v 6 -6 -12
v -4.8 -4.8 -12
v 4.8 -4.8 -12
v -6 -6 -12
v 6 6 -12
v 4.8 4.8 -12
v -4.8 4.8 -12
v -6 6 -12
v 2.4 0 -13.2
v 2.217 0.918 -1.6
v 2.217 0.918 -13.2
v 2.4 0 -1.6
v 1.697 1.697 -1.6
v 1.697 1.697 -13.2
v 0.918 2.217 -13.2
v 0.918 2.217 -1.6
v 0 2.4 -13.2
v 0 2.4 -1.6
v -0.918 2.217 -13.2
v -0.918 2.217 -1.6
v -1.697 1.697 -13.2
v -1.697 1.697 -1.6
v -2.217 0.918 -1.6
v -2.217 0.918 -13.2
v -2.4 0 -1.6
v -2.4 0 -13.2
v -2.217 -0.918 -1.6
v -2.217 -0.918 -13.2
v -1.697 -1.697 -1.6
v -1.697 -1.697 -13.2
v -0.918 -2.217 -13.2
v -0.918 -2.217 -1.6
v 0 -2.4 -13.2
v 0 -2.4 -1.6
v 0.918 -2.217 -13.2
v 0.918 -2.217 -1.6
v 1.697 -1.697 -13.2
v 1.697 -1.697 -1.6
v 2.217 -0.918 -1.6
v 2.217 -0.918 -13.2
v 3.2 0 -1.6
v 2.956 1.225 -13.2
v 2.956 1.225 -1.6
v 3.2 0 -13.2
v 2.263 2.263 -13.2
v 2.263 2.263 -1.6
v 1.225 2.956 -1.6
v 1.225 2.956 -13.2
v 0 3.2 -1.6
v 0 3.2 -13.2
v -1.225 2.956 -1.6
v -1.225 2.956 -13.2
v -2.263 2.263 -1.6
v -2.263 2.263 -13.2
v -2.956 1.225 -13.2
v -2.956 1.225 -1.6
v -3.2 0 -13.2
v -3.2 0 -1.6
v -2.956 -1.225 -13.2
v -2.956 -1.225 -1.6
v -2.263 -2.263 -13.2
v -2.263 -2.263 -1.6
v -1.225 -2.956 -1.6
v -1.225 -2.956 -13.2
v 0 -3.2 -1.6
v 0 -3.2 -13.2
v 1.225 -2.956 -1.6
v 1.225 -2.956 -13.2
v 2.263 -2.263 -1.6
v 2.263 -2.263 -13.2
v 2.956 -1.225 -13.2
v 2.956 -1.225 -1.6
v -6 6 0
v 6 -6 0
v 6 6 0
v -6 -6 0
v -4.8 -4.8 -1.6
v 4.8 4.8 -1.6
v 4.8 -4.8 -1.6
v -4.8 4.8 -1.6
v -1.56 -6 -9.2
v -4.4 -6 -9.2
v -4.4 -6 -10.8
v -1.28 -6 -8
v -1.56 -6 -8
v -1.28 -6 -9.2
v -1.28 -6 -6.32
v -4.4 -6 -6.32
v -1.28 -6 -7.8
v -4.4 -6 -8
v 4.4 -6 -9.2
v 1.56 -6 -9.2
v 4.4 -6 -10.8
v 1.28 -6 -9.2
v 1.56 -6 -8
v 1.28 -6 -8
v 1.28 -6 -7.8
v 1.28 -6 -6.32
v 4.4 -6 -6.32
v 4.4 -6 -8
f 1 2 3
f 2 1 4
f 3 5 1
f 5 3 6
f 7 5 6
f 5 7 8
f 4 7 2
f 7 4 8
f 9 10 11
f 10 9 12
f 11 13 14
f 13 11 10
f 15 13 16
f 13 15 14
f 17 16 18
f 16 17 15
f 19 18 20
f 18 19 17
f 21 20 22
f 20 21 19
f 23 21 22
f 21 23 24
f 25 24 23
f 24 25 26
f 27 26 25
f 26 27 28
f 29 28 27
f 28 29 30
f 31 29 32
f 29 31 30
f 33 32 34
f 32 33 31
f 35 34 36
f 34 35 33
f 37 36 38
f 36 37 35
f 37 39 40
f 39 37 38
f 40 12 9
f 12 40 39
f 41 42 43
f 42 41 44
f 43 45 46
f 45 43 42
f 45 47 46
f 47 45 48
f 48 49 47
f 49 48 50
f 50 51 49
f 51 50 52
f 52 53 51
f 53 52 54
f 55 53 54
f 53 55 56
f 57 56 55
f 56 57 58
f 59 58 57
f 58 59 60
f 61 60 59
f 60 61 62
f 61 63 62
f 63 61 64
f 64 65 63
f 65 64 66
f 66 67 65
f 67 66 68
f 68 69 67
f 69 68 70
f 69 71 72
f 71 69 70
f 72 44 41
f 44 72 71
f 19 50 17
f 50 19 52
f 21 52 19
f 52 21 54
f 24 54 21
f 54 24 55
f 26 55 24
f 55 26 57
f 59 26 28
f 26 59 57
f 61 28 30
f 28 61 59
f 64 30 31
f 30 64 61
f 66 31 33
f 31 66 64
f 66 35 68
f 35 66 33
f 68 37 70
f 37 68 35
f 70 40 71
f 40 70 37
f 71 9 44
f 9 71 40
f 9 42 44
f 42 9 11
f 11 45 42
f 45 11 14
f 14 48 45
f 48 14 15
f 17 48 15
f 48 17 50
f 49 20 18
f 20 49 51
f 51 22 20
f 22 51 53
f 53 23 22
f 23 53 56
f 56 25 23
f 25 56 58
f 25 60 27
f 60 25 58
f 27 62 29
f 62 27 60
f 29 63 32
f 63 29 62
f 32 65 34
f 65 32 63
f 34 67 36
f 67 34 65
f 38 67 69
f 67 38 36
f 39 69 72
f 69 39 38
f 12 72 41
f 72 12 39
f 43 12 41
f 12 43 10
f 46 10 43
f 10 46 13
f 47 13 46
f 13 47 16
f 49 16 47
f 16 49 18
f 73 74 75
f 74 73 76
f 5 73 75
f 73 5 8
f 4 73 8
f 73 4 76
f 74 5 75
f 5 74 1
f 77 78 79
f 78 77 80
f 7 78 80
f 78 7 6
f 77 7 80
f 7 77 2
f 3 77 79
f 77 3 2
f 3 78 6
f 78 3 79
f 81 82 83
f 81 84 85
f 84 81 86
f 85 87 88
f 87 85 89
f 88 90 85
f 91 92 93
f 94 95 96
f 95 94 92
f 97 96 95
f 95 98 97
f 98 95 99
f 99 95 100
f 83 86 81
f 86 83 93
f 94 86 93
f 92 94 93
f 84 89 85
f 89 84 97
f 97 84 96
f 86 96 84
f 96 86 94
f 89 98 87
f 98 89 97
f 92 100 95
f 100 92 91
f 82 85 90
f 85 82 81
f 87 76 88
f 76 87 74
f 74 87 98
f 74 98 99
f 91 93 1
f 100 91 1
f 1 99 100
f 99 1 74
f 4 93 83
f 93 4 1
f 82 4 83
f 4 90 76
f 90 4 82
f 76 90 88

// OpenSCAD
// file: ../p/4-4ring3.scad
use <../lib.scad>
$fa=1; $fs=0.2;
function ldraw_lib__4_4ring3(realsolid=false) = [
// 0 Ring  3 x 1.0
// 0 Name: 4-4ring3.dat
// 0 Author: James Jessiman
// 0 !LDRAW_ORG Primitive UPDATE 2009-01
// 0 !LICENSE Licensed under CC BY 2.0 and CC BY 4.0 : see CAreadme.txt
// 
// 0 BFC CERTIFY CCW
  [0,"BFC","CERTIFY"],
  [0,"BFC","CCW"],
// 
// 0 !HISTORY 1998-12-15 [PTadmin] Official Update 1998-10
// 0 !HISTORY 2002-04-05 [hafhead] Added BFC statement
// 0 !HISTORY 2002-04-25 [PTadmin] Official Update 2002-02
// 0 !HISTORY 2007-06-24 [PTadmin] Header formatted for Contributor Agreement
// 0 !HISTORY 2008-07-01 [PTadmin] Official Update 2008-01
// 0 !HISTORY 2008-08-26 [cwdee] Switch polygon winding and rename
// 0 !HISTORY 2009-05-02 [PTadmin] Official Update 2009-01
// 
// 
// 4 16 -1.5308 0 3.6956 -1.1481 0 2.7717 0 0 3 0 0 4
  [4,16,-1.5308,0,3.6956,-1.1481,0,2.7717,0,0,3,0,0,4],
// 4 16 -2.8284 0 2.8284 -2.1213 0 2.1213 -1.1481 0 2.7717 -1.5308 0 3.6956
  [4,16,-2.8284,0,2.8284,-2.1213,0,2.1213,-1.1481,0,2.7717,-1.5308,0,3.6956],
// 4 16 -3.6956 0 1.5308 -2.7717 0 1.1481 -2.1213 0 2.1213 -2.8284 0 2.8284
  [4,16,-3.6956,0,1.5308,-2.7717,0,1.1481,-2.1213,0,2.1213,-2.8284,0,2.8284],
// 4 16 -4 0 0 -3 0 0 -2.7717 0 1.1481 -3.6956 0 1.5308
  [4,16,-4,0,0,-3,0,0,-2.7717,0,1.1481,-3.6956,0,1.5308],
// 4 16 -3.6956 0 -1.5308 -2.7717 0 -1.1481 -3 0 0 -4 0 0
  [4,16,-3.6956,0,-1.5308,-2.7717,0,-1.1481,-3,0,0,-4,0,0],
// 4 16 -2.8284 0 -2.8284 -2.1213 0 -2.1213 -2.7717 0 -1.1481 -3.6956 0 -1.5308
  [4,16,-2.8284,0,-2.8284,-2.1213,0,-2.1213,-2.7717,0,-1.1481,-3.6956,0,-1.5308],
// 4 16 -1.5308 0 -3.6956 -1.1481 0 -2.7717 -2.1213 0 -2.1213 -2.8284 0 -2.8284
  [4,16,-1.5308,0,-3.6956,-1.1481,0,-2.7717,-2.1213,0,-2.1213,-2.8284,0,-2.8284],
// 4 16 0 0 -4 0 0 -3 -1.1481 0 -2.7717 -1.5308 0 -3.6956
  [4,16,0,0,-4,0,0,-3,-1.1481,0,-2.7717,-1.5308,0,-3.6956],
// 4 16 1.5308 0 -3.6956 1.1481 0 -2.7717 0 0 -3 0 0 -4
  [4,16,1.5308,0,-3.6956,1.1481,0,-2.7717,0,0,-3,0,0,-4],
// 4 16 2.8284 0 -2.8284 2.1213 0 -2.1213 1.1481 0 -2.7717 1.5308 0 -3.6956
  [4,16,2.8284,0,-2.8284,2.1213,0,-2.1213,1.1481,0,-2.7717,1.5308,0,-3.6956],
// 4 16 3.6956 0 -1.5308 2.7717 0 -1.1481 2.1213 0 -2.1213 2.8284 0 -2.8284
  [4,16,3.6956,0,-1.5308,2.7717,0,-1.1481,2.1213,0,-2.1213,2.8284,0,-2.8284],
// 4 16 4 0 0 3 0 0 2.7717 0 -1.1481 3.6956 0 -1.5308
  [4,16,4,0,0,3,0,0,2.7717,0,-1.1481,3.6956,0,-1.5308],
// 4 16 3.6956 0 1.5308 2.7717 0 1.1481 3 0 0 4 0 0
  [4,16,3.6956,0,1.5308,2.7717,0,1.1481,3,0,0,4,0,0],
// 4 16 2.8284 0 2.8284 2.1213 0 2.1213 2.7717 0 1.1481 3.6956 0 1.5308
  [4,16,2.8284,0,2.8284,2.1213,0,2.1213,2.7717,0,1.1481,3.6956,0,1.5308],
// 4 16 1.5308 0 3.6956 1.1481 0 2.7717 2.1213 0 2.1213 2.8284 0 2.8284
  [4,16,1.5308,0,3.6956,1.1481,0,2.7717,2.1213,0,2.1213,2.8284,0,2.8284],
// 4 16 0 0 4 0 0 3 1.1481 0 2.7717 1.5308 0 3.6956
  [4,16,0,0,4,0,0,3,1.1481,0,2.7717,1.5308,0,3.6956],
// 0
];
module ldraw_lib__4_4ring3(step=0, col=false, unit=2/5, alt=false, line=0.2, solid=!$preview)
    makepoly(ldraw_lib__4_4ring3(solid), step=step, col=col, unit=unit, alt=alt, line=line, solid=solid);
ldraw_lib__4_4ring3(line=0.2);
// file: ../p/4-4edge.scad
use <../lib.scad>
function ldraw_lib__4_4edge() = [
// 0 Circle 1.0
// 0 Name: 4-4edge.dat
// 0 Author: James Jessiman
// 0 !LDRAW_ORG Primitive UPDATE 2017-01
// 0 !LICENSE Licensed under CC BY 2.0 and CC BY 4.0 : see CAreadme.txt
// 
// 0 BFC CERTIFY CCW
  [0,"BFC","CERTIFY"],
  [0,"BFC","CCW"],
// 
// 0 !HISTORY 1998-12-15 [PTadmin] Official Update 1998-10
// 0 !HISTORY 2005-12-28 [PTadmin] Official Update 2005-01
// 0 !HISTORY 2007-06-24 [PTadmin] Header formatted for Contributor Agreement
// 0 !HISTORY 2008-07-01 [PTadmin] Official Update 2008-01
// 0 !HISTORY 2017-01-15 [Steffen] BFCed
// 0 !HISTORY 2017-12-30 [PTadmin] Official Update 2017-01
// 
// 
// 2 24 1 0 0 0.9239 0 0.3827
  [2,24,1,0,0,0.9239,0,0.3827],
// 2 24 0.9239 0 0.3827 0.7071 0 0.7071
  [2,24,0.9239,0,0.3827,0.7071,0,0.7071],
// 2 24 0.7071 0 0.7071 0.3827 0 0.9239
  [2,24,0.7071,0,0.7071,0.3827,0,0.9239],
// 2 24 0.3827 0 0.9239 0 0 1
  [2,24,0.3827,0,0.9239,0,0,1],
// 2 24 0 0 1 -0.3827 0 0.9239
  [2,24,0,0,1,-0.3827,0,0.9239],
// 2 24 -0.3827 0 0.9239 -0.7071 0 0.7071
  [2,24,-0.3827,0,0.9239,-0.7071,0,0.7071],
// 2 24 -0.7071 0 0.7071 -0.9239 0 0.3827
  [2,24,-0.7071,0,0.7071,-0.9239,0,0.3827],
// 2 24 -0.9239 0 0.3827 -1 0 -0
  [2,24,-0.9239,0,0.3827,-1,0,-0],
// 2 24 -1 0 -0 -0.9239 0 -0.3827
  [2,24,-1,0,-0,-0.9239,0,-0.3827],
// 2 24 -0.9239 0 -0.3827 -0.7071 0 -0.7071
  [2,24,-0.9239,0,-0.3827,-0.7071,0,-0.7071],
// 2 24 -0.7071 0 -0.7071 -0.3827 0 -0.9239
  [2,24,-0.7071,0,-0.7071,-0.3827,0,-0.9239],
// 2 24 -0.3827 0 -0.9239 0 0 -1
  [2,24,-0.3827,0,-0.9239,0,0,-1],
// 2 24 0 0 -1 0.3827 0 -0.9239
  [2,24,0,0,-1,0.3827,0,-0.9239],
// 2 24 0.3827 0 -0.9239 0.7071 0 -0.7071
  [2,24,0.3827,0,-0.9239,0.7071,0,-0.7071],
// 2 24 0.7071 0 -0.7071 0.9239 0 -0.3827
  [2,24,0.7071,0,-0.7071,0.9239,0,-0.3827],
// 2 24 0.9239 0 -0.3827 1 0 0
  [2,24,0.9239,0,-0.3827,1,0,0],
];
module ldraw_lib__4_4edge(step=0, col=false, unit=2/5, alt=false, line=0.2, solid=!$preview)
    makepoly(ldraw_lib__4_4edge(), step=step, col=col, unit=unit, alt=alt, line=line, solid=solid);
ldraw_lib__4_4edge(line=0.2);
// file: ../p/4-4cyli.scad
use <../lib.scad>
$fa=1; $fs=0.2;
function ldraw_lib__4_4cyli(realsolid=false) = [
// 0 Cylinder 1.0
// 0 Name: 4-4cyli.dat
// 0 Author: James Jessiman
// 0 !LDRAW_ORG Primitive UPDATE 2005-01
// 0 !LICENSE Licensed under CC BY 2.0 and CC BY 4.0 : see CAreadme.txt
// 
// 0 BFC CERTIFY CCW
  [0,"BFC","CERTIFY"],
  [0,"BFC","CCW"],
// 
// 0 !HISTORY 1998-12-15 [PTadmin] Official Update 1998-10
// 0 !HISTORY 2002-03-23 [sbliss] Added BFC statement; merged headers from files in distributions LDraw 0.27 and Complete.
// 0 !HISTORY 2002-04-25 [PTadmin] Official Update 2002-02
// 0 !HISTORY 2004-12-14 [guyvivan] BFC CCW
// 0 !HISTORY 2005-12-28 [PTadmin] Official Update 2005-01
// 0 !HISTORY 2007-06-24 [PTadmin] Header formatted for Contributor Agreement
// 0 !HISTORY 2008-07-01 [PTadmin] Official Update 2008-01
// 
// 
// 4 16 1 1 0 0.9239 1 0.3827 0.9239 0 0.3827 1 0 0
  [4,16,1,1,0,0.9239,1,0.3827,0.9239,0,0.3827,1,0,0],
// 5 24 1 0 0 1 1 0 0.9239 0 0.3827 0.9239 0 -0.3827
  [5,24,1,0,0,1,1,0,0.9239,0,0.3827,0.9239,0,-0.3827],
// 4 16 0.9239 1 0.3827 0.7071 1 0.7071 0.7071 0 0.7071 0.9239 0 0.3827
  [4,16,0.9239,1,0.3827,0.7071,1,0.7071,0.7071,0,0.7071,0.9239,0,0.3827],
// 5 24 0.9239 0 0.3827 0.9239 1 0.3827 0.7071 0 0.7071 1 0 0
  [5,24,0.9239,0,0.3827,0.9239,1,0.3827,0.7071,0,0.7071,1,0,0],
// 4 16 0.7071 1 0.7071 0.3827 1 0.9239 0.3827 0 0.9239 0.7071 0 0.7071
  [4,16,0.7071,1,0.7071,0.3827,1,0.9239,0.3827,0,0.9239,0.7071,0,0.7071],
// 5 24 0.7071 0 0.7071 0.7071 1 0.7071 0.3827 0 0.9239 0.9239 0 0.3827
  [5,24,0.7071,0,0.7071,0.7071,1,0.7071,0.3827,0,0.9239,0.9239,0,0.3827],
// 4 16 0.3827 1 0.9239 0 1 1 0 0 1 0.3827 0 0.9239
  [4,16,0.3827,1,0.9239,0,1,1,0,0,1,0.3827,0,0.9239],
// 5 24 0.3827 0 0.9239 0.3827 1 0.9239 0 0 1 0.7071 0 0.7071
  [5,24,0.3827,0,0.9239,0.3827,1,0.9239,0,0,1,0.7071,0,0.7071],
// 4 16 0 1 1 -0.3827 1 0.9239 -0.3827 0 0.9239 0 0 1
  [4,16,0,1,1,-0.3827,1,0.9239,-0.3827,0,0.9239,0,0,1],
// 5 24 0 0 1 0 1 1 -0.3827 0 0.9239 0.3827 0 0.9239
  [5,24,0,0,1,0,1,1,-0.3827,0,0.9239,0.3827,0,0.9239],
// 4 16 -0.3827 1 0.9239 -0.7071 1 0.7071 -0.7071 0 0.7071 -0.3827 0 0.9239
  [4,16,-0.3827,1,0.9239,-0.7071,1,0.7071,-0.7071,0,0.7071,-0.3827,0,0.9239],
// 5 24 -0.3827 0 0.9239 -0.3827 1 0.9239 -0.7071 0 0.7071 0 0 1
  [5,24,-0.3827,0,0.9239,-0.3827,1,0.9239,-0.7071,0,0.7071,0,0,1],
// 4 16 -0.7071 1 0.7071 -0.9239 1 0.3827 -0.9239 0 0.3827 -0.7071 0 0.7071
  [4,16,-0.7071,1,0.7071,-0.9239,1,0.3827,-0.9239,0,0.3827,-0.7071,0,0.7071],
// 5 24 -0.7071 0 0.7071 -0.7071 1 0.7071 -0.9239 0 0.3827 -0.3827 0 0.9239
  [5,24,-0.7071,0,0.7071,-0.7071,1,0.7071,-0.9239,0,0.3827,-0.3827,0,0.9239],
// 4 16 -0.9239 1 0.3827 -1 1 0 -1 0 0 -0.9239 0 0.3827
  [4,16,-0.9239,1,0.3827,-1,1,0,-1,0,0,-0.9239,0,0.3827],
// 5 24 -0.9239 0 0.3827 -0.9239 1 0.3827 -1 0 0 -0.7071 0 0.7071
  [5,24,-0.9239,0,0.3827,-0.9239,1,0.3827,-1,0,0,-0.7071,0,0.7071],
// 4 16 -1 1 0 -0.9239 1 -0.3827 -0.9239 0 -0.3827 -1 0 0
  [4,16,-1,1,0,-0.9239,1,-0.3827,-0.9239,0,-0.3827,-1,0,0],
// 5 24 -1 0 0 -1 1 0 -0.9239 0 -0.3827 -0.9239 0 0.3827
  [5,24,-1,0,0,-1,1,0,-0.9239,0,-0.3827,-0.9239,0,0.3827],
// 4 16 -0.9239 1 -0.3827 -0.7071 1 -0.7071 -0.7071 0 -0.7071 -0.9239 0 -0.3827
  [4,16,-0.9239,1,-0.3827,-0.7071,1,-0.7071,-0.7071,0,-0.7071,-0.9239,0,-0.3827],
// 5 24 -0.9239 0 -0.3827 -0.9239 1 -0.3827 -0.7071 0 -0.7071 -1 0 0
  [5,24,-0.9239,0,-0.3827,-0.9239,1,-0.3827,-0.7071,0,-0.7071,-1,0,0],
// 4 16 -0.7071 1 -0.7071 -0.3827 1 -0.9239 -0.3827 0 -0.9239 -0.7071 0 -0.7071
  [4,16,-0.7071,1,-0.7071,-0.3827,1,-0.9239,-0.3827,0,-0.9239,-0.7071,0,-0.7071],
// 5 24 -0.7071 0 -0.7071 -0.7071 1 -0.7071 -0.3827 0 -0.9239 -0.9239 0 -0.3827
  [5,24,-0.7071,0,-0.7071,-0.7071,1,-0.7071,-0.3827,0,-0.9239,-0.9239,0,-0.3827],
// 4 16 -0.3827 1 -0.9239 0 1 -1 0 0 -1 -0.3827 0 -0.9239
  [4,16,-0.3827,1,-0.9239,0,1,-1,0,0,-1,-0.3827,0,-0.9239],
// 5 24 -0.3827 0 -0.9239 -0.3827 1 -0.9239 0 0 -1 -0.7071 0 -0.7071
  [5,24,-0.3827,0,-0.9239,-0.3827,1,-0.9239,0,0,-1,-0.7071,0,-0.7071],
// 4 16 0 1 -1 0.3827 1 -0.9239 0.3827 0 -0.9239 0 0 -1
  [4,16,0,1,-1,0.3827,1,-0.9239,0.3827,0,-0.9239,0,0,-1],
// 5 24 0 0 -1 0 1 -1 0.3827 0 -0.9239 -0.3827 0 -0.9239
  [5,24,0,0,-1,0,1,-1,0.3827,0,-0.9239,-0.3827,0,-0.9239],
// 4 16 0.3827 1 -0.9239 0.7071 1 -0.7071 0.7071 0 -0.7071 0.3827 0 -0.9239
  [4,16,0.3827,1,-0.9239,0.7071,1,-0.7071,0.7071,0,-0.7071,0.3827,0,-0.9239],
// 5 24 0.3827 0 -0.9239 0.3827 1 -0.9239 0.7071 0 -0.7071 0 0 -1
  [5,24,0.3827,0,-0.9239,0.3827,1,-0.9239,0.7071,0,-0.7071,0,0,-1],
// 4 16 0.7071 1 -0.7071 0.9239 1 -0.3827 0.9239 0 -0.3827 0.7071 0 -0.7071
  [4,16,0.7071,1,-0.7071,0.9239,1,-0.3827,0.9239,0,-0.3827,0.7071,0,-0.7071],
// 5 24 0.7071 0 -0.7071 0.7071 1 -0.7071 0.9239 0 -0.3827 0.3827 0 -0.9239
  [5,24,0.7071,0,-0.7071,0.7071,1,-0.7071,0.9239,0,-0.3827,0.3827,0,-0.9239],
// 4 16 0.9239 1 -0.3827 1 1 0 1 0 0 0.9239 0 -0.3827
  [4,16,0.9239,1,-0.3827,1,1,0,1,0,0,0.9239,0,-0.3827],
// 5 24 0.9239 0 -0.3827 0.9239 1 -0.3827 1 0 0 0.7071 0 -0.7071
  [5,24,0.9239,0,-0.3827,0.9239,1,-0.3827,1,0,0,0.7071,0,-0.7071],
// 0
];
module ldraw_lib__4_4cyli(step=0, col=false, unit=2/5, alt=false, line=0.2, solid=!$preview)
    makepoly(ldraw_lib__4_4cyli(solid), step=step, col=col, unit=unit, alt=alt, line=line, solid=solid);
ldraw_lib__4_4cyli(line=0.2);
// file: ../p/stud4.scad
use <../lib.scad>
use <4-4cyli.scad>
use <4-4edge.scad>
use <4-4ring3.scad>
function ldraw_lib__stud4() = [
// 0 Stud Tube Open
// 0 Name: stud4.dat
// 0 Author: James Jessiman
// 0 !LDRAW_ORG Primitive UPDATE 2009-02
// 0 !LICENSE Licensed under CC BY 4.0 : see CAreadme.txt
// 
// 0 BFC CERTIFY CCW
  [0,"BFC","CERTIFY"],
  [0,"BFC","CCW"],
// 
// 0 !HISTORY 1999-07-05 [PTadmin] Official Update 1999-05
// 0 !HISTORY 2002-04-04 [sbliss] Modified for BFC compliance
// 0 !HISTORY 2002-04-25 [PTadmin] Official Update 2002-02
// 0 !HISTORY 2007-06-24 [PTadmin] Header formatted for Contributor Agreement
// 0 !HISTORY 2008-07-01 [PTadmin] Official Update 2008-01
// 0 !HISTORY 2009-06-21 [cwdee] Update ring references to 4-4ring
// 0 !HISTORY 2009-09-03 [PTadmin] Official Update 2009-02
// 
// 
// 1 16 0 -4 0 6 0 0 0 1 0 0 0 6 4-4edge.dat
  [1,16,0,-4,0,6,0,0,0,1,0,0,0,6, ldraw_lib__4_4edge()],
// 1 16 0 -4 0 8 0 0 0 1 0 0 0 8 4-4edge.dat
  [1,16,0,-4,0,8,0,0,0,1,0,0,0,8, ldraw_lib__4_4edge()],
// 1 16 0 0 0 6 0 0 0 1 0 0 0 6 4-4edge.dat
  [1,16,0,0,0,6,0,0,0,1,0,0,0,6, ldraw_lib__4_4edge()],
// 1 16 0 0 0 8 0 0 0 1 0 0 0 8 4-4edge.dat
  [1,16,0,0,0,8,0,0,0,1,0,0,0,8, ldraw_lib__4_4edge()],
// 0 BFC INVERTNEXT
  [0,"BFC","INVERTNEXT"],
// 1 16 0 -4 0 6 0 0 0 4 0 0 0 6 4-4cyli.dat
  [1,16,0,-4,0,6,0,0,0,4,0,0,0,6, ldraw_lib__4_4cyli()],
// 1 16 0 -4 0 8 0 0 0 4 0 0 0 8 4-4cyli.dat
  [1,16,0,-4,0,8,0,0,0,4,0,0,0,8, ldraw_lib__4_4cyli()],
// 1 16 0 -4 0 2 0 0 0 1 0 0 0 2 4-4ring3.dat
  [1,16,0,-4,0,2,0,0,0,1,0,0,0,2, ldraw_lib__4_4ring3()],
  [-1,16,0,0,0,2,0,0,0,-1,0,0,0,2, ldraw_lib__4_4ring3()],
// 0
];
module ldraw_lib__stud4(step=0, col=false, unit=2/5, alt=false, line=0.2, solid=!$preview)
    makepoly(ldraw_lib__stud4(), step=step, col=col, unit=unit, alt=alt, line=line, solid=solid);
ldraw_lib__stud4(line=0.2);
// file: ../p/box5.scad
use <../lib.scad>
function ldraw_lib__box5() = [
// 0 Box with 5 Faces and All Edges
// 0 Name: box5.dat
// 0 Author: James Jessiman
// 0 !LDRAW_ORG Primitive UPDATE 2012-01
// 0 !LICENSE Licensed under CC BY 2.0 and CC BY 4.0 : see CAreadme.txt
// 
// 0 BFC CERTIFY CCW
  [0,"BFC","CERTIFY"],
  [0,"BFC","CCW"],
// 
// 0 !HISTORY 2002-04-03 [sbliss] Modified for BFC compliance
// 0 !HISTORY 2002-04-25 [PTadmin] Official Update 2002-02
// 0 !HISTORY 2007-06-24 [PTadmin] Header formatted for Contributor Agreement
// 0 !HISTORY 2008-07-01 [PTadmin] Official Update 2008-01
// 0 !HISTORY 2012-02-16 [Philo] Changed to CCW
// 0 !HISTORY 2012-03-30 [PTadmin] Official Update 2012-01
// 
// 
// 2 24 1 1 1 -1 1 1
  [2,24,1,1,1,-1,1,1],
// 2 24 -1 1 1 -1 1 -1
  [2,24,-1,1,1,-1,1,-1],
// 2 24 -1 1 -1 1 1 -1
  [2,24,-1,1,-1,1,1,-1],
// 2 24 1 1 -1 1 1 1
  [2,24,1,1,-1,1,1,1],
// 2 24 1 0 1 -1 0 1
  [2,24,1,0,1,-1,0,1],
// 2 24 -1 0 1 -1 0 -1
  [2,24,-1,0,1,-1,0,-1],
// 2 24 -1 0 -1 1 0 -1
  [2,24,-1,0,-1,1,0,-1],
// 2 24 1 0 -1 1 0 1
  [2,24,1,0,-1,1,0,1],
// 2 24 1 0 1 1 1 1
  [2,24,1,0,1,1,1,1],
// 2 24 -1 0 1 -1 1 1
  [2,24,-1,0,1,-1,1,1],
// 2 24 1 0 -1 1 1 -1
  [2,24,1,0,-1,1,1,-1],
// 2 24 -1 0 -1 -1 1 -1
  [2,24,-1,0,-1,-1,1,-1],
// 4 16 -1 1 1 1 1 1 1 1 -1 -1 1 -1
  [4,16,-1,1,1,1,1,1,1,1,-1,-1,1,-1],
// 4 16 -1 1 1 -1 0 1 1 0 1 1 1 1
  [4,16,-1,1,1,-1,0,1,1,0,1,1,1,1],
// 4 16 -1 1 -1 -1 0 -1 -1 0 1 -1 1 1
  [4,16,-1,1,-1,-1,0,-1,-1,0,1,-1,1,1],
// 4 16 1 1 -1 1 0 -1 -1 0 -1 -1 1 -1
  [4,16,1,1,-1,1,0,-1,-1,0,-1,-1,1,-1],
// 4 16 1 1 1 1 0 1 1 0 -1 1 1 -1
  [4,16,1,1,1,1,0,1,1,0,-1,1,1,-1],
];
makepoly(ldraw_lib__box5(), line=0.2);
// file: ../p/box4t.scad
use <../lib.scad>
function ldraw_lib__box4t() = [
// 0 Box with 4 Adjacent Faces and All Edges
// 0 Name: box4t.dat
// 0 Author: Tore Eriksson [Tore_Eriksson]
// 0 !LDRAW_ORG Primitive UPDATE 2003-02
// 0 !LICENSE Licensed under CC BY 2.0 and CC BY 4.0 : see CAreadme.txt
// 
// 0 BFC CERTIFY CCW
  [0,"BFC","CERTIFY"],
  [0,"BFC","CCW"],
// 
// 0 !HISTORY 1997-09-29 [PTadmin] Official Update 1997-15
// 0 !HISTORY 2002-08-31 [izanette] Modified with WINDZ for BFC compliance
// 0 !HISTORY 2003-08-01 [PTadmin] Official Update 2003-02
// 0 !HISTORY 2007-06-24 [PTadmin] Header formatted for Contributor Agreement
// 0 !HISTORY 2008-07-01 [PTadmin] Official Update 2008-01
// 
// 
// 2 24 1 1 1 -1 1 1
  [2,24,1,1,1,-1,1,1],
// 2 24 -1 1 1 -1 1 -1
  [2,24,-1,1,1,-1,1,-1],
// 2 24 -1 1 -1 1 1 -1
  [2,24,-1,1,-1,1,1,-1],
// 2 24 1 1 -1 1 1 1
  [2,24,1,1,-1,1,1,1],
// 2 24 1 0 1 -1 0 1
  [2,24,1,0,1,-1,0,1],
// 2 24 -1 0 1 -1 0 -1
  [2,24,-1,0,1,-1,0,-1],
// 2 24 -1 0 -1 1 0 -1
  [2,24,-1,0,-1,1,0,-1],
// 2 24 1 0 -1 1 0 1
  [2,24,1,0,-1,1,0,1],
// 2 24 1 0 1 1 1 1
  [2,24,1,0,1,1,1,1],
// 2 24 -1 0 1 -1 1 1
  [2,24,-1,0,1,-1,1,1],
// 2 24 1 0 -1 1 1 -1
  [2,24,1,0,-1,1,1,-1],
// 2 24 -1 0 -1 -1 1 -1
  [2,24,-1,0,-1,-1,1,-1],
// 4 16 1 1 1 1 1 -1 -1 1 -1 -1 1 1
  [4,16,1,1,1,1,1,-1,-1,1,-1,-1,1,1],
// 4 16 1 1 1 -1 1 1 -1 0 1 1 0 1
  [4,16,1,1,1,-1,1,1,-1,0,1,1,0,1],
// 4 16 -1 1 1 -1 1 -1 -1 0 -1 -1 0 1
  [4,16,-1,1,1,-1,1,-1,-1,0,-1,-1,0,1],
// 0 4 16 -1 1 -1 -1 0 -1 1 0 -1 1 1 -1
// 4 16 1 1 -1 1 1 1 1 0 1 1 0 -1
  [4,16,1,1,-1,1,1,1,1,0,1,1,0,-1],
// 0
];
makepoly(ldraw_lib__box4t(), line=0.2);
// file: s/19729s01.scad
use <../../lib.scad>
use <../../p/box4t.scad>
use <../../p/box5.scad>
use <../../p/stud4.scad>
function ldraw_lib__s__19729s01() = [
// 0 ~Minifig Head Cuboid without Front Surface
// 0 Name: s\19729s01.dat
// 0 Author: Mark Kennedy [mkennedy]
// 0 !LDRAW_ORG Subpart UPDATE 2016-01
// 0 !LICENSE Licensed under CC BY 4.0 : see CAreadme.txt
// 
// 0 BFC CERTIFY CW
  [0,"BFC","CERTIFY"],
  [0,"BFC","CW"],
// 
// 0 !HISTORY 2016-03-18 {LEGO Digital Designer} Original part shape
// 0 !HISTORY 2016-03-28 [mkennedy] Primitive substitution
// 0 !HISTORY 2016-12-31 [PTadmin] Official Update 2016-01
// 
// 
// 4 16 15 30 -15 12 30 -12 -12 30 -12 -15 30 -15
  [4,16,15,30,-15,12,30,-12,-12,30,-12,-15,30,-15],
// 4 16 15 30 15 12 30 12 12 30 -12 15 30 -15
  [4,16,15,30,15,12,30,12,12,30,-12,15,30,-15],
// 4 16 -15 30 15 -12 30 12 12 30 12 15 30 15
  [4,16,-15,30,15,-12,30,12,12,30,12,15,30,15],
// 4 16 -15 30 -15 -12 30 -12 -12 30 12 -15 30 15
  [4,16,-15,30,-15,-12,30,-12,-12,30,12,-15,30,15],
// 0
// 1 16 0 4 0 1 0 0 0 -7.25 0 0 0 1 stud4.dat
  [1,16,0,4,0,1,0,0,0,-7.25,0,0,0,1, ldraw_lib__stud4()],
// 1 16 0 30 0 15 0 0 0 -30 0 0 0 15 box4t.dat
  [1,16,0,30,0,15,0,0,0,-30,0,0,0,15, ldraw_lib__box4t()],
// 0 BFC INVERTNEXT
  [0,"BFC","INVERTNEXT"],
// 1 16 0 30 0 12 0 0 0 -26 0 0 0 12 box5.dat
  [1,16,0,30,0,12,0,0,0,-26,0,0,0,12, ldraw_lib__box5()],
// 
];
module ldraw_lib__s__19729s01(step=0, col=false, unit=2/5, alt=false, line=0.2, solid=!$preview)
    makepoly(ldraw_lib__s__19729s01(), step=step, col=col, unit=unit, alt=alt, line=line, solid=solid);
ldraw_lib__s__19729s01(line=0.2);
// main file
use <../lib.scad>
use <s/19729s01.scad>
function ldraw_lib__19729p05() = [
// 0 Minifig Head Cuboid with Minecraft Skeleton Pattern
// 0 Name: 19729p05.dat
// 0 Author: Evert-Jan Boer [ejboer]
// 0 !LDRAW_ORG Part UPDATE 2024-04
// 0 !LICENSE Licensed under CC BY 4.0 : see CAreadme.txt
// 
// 0 BFC CERTIFY CCW
  [0,"BFC","CERTIFY"],
  [0,"BFC","CCW"],
// 
// 0 !KEYWORDS Bricklink 19729pb004, Brickowl 33817, Rebrickable 19729pr0002
// 0 !KEYWORDS Set 21114, Set 21116, Set 21121, Set 21144, Set 21155
// 
// 0 !HISTORY 2024-05-28 [OrionP] Official Update 2024-04
// 
// 
// 1 16 0 0 0 1 0 0 0 1 0 0 0 1 s\19729s01.dat
  [1,16,0,0,0,1,0,0,0,1,0,0,0,1, ldraw_lib__s__19729s01()],
// 3 0 -3.9 23 -15 -11 23 -15 -11 27 -15
  [3,0,-3.9,23,-15,-11,23,-15,-11,27,-15],
// 4 0 -3.9 20 -15 -3.9 23 -15 -3.2 23 -15 -3.2 20 -15
  [4,0,-3.9,20,-15,-3.9,23,-15,-3.2,23,-15,-3.2,20,-15],
// 4 0 -3.2 19.5 -15 -3.2 15.8 -15 -11 15.8 -15 -3.9 20 -15
  [4,0,-3.2,19.5,-15,-3.2,15.8,-15,-11,15.8,-15,-3.9,20,-15],
// 3 0 -11 15.8 -15 -11 20 -15 -3.9 20 -15
  [3,0,-11,15.8,-15,-11,20,-15,-3.9,20,-15],
// 3 0 11 23 -15 3.9 23 -15 11 27 -15
  [3,0,11,23,-15,3.9,23,-15,11,27,-15],
// 4 0 3.9 20 -15 3.2 20 -15 3.2 23 -15 3.9 23 -15
  [4,0,3.9,20,-15,3.2,20,-15,3.2,23,-15,3.9,23,-15],
// 3 0 3.2 19.5 -15 3.2 20 -15 3.9 20 -15
  [3,0,3.2,19.5,-15,3.2,20,-15,3.9,20,-15],
// 4 0 3.2 19.5 -15 3.9 20 -15 11 15.8 -15 3.2 15.8 -15
  [4,0,3.2,19.5,-15,3.9,20,-15,11,15.8,-15,3.2,15.8,-15],
// 3 0 11 15.8 -15 3.9 20 -15 11 20 -15
  [3,0,11,15.8,-15,3.9,20,-15,11,20,-15],
// 4 0 -3.9 23 -15 -11 27 -15 11 27 -15 -3.2 23 -15
  [4,0,-3.9,23,-15,-11,27,-15,11,27,-15,-3.2,23,-15],
// 3 0 3.2 23 -15 -3.2 23 -15 11 27 -15
  [3,0,3.2,23,-15,-3.2,23,-15,11,27,-15],
// 3 0 3.9 23 -15 3.2 23 -15 11 27 -15
  [3,0,3.9,23,-15,3.2,23,-15,11,27,-15],
// 4 0 -3.9 20 -15 -3.2 20 -15 3.2 19.5 -15 -3.2 19.5 -15
  [4,0,-3.9,20,-15,-3.2,20,-15,3.2,19.5,-15,-3.2,19.5,-15],
// 3 0 3.2 19.5 -15 -3.2 20 -15 3.2 20 -15
  [3,0,3.2,19.5,-15,-3.2,20,-15,3.2,20,-15],
// 4 71 -3.2 20 -15 -3.2 23 -15 3.2 23 -15 3.2 20 -15
  [4,71,-3.2,20,-15,-3.2,23,-15,3.2,23,-15,3.2,20,-15],
// 4 16 -3.2 15.8 -15 -3.2 19.5 -15 3.2 19.5 -15 3.2 15.8 -15
  [4,16,-3.2,15.8,-15,-3.2,19.5,-15,3.2,19.5,-15,3.2,15.8,-15],
// 4 16 3.9 20 -15 3.9 23 -15 11 23 -15 11 20 -15
  [4,16,3.9,20,-15,3.9,23,-15,11,23,-15,11,20,-15],
// 4 16 -11 20 -15 -11 23 -15 -3.9 23 -15 -3.9 20 -15
  [4,16,-11,20,-15,-11,23,-15,-3.9,23,-15,-3.9,20,-15],
// 4 16 15 0 -15 -15 0 -15 -11 15.8 -15 -3.2 15.8 -15
  [4,16,15,0,-15,-15,0,-15,-11,15.8,-15,-3.2,15.8,-15],
// 3 16 15 0 -15 -3.2 15.8 -15 3.2 15.8 -15
  [3,16,15,0,-15,-3.2,15.8,-15,3.2,15.8,-15],
// 3 16 15 0 -15 3.2 15.8 -15 11 15.8 -15
  [3,16,15,0,-15,3.2,15.8,-15,11,15.8,-15],
// 3 16 11 23 -15 11 27 -15 15 30 -15
  [3,16,11,23,-15,11,27,-15,15,30,-15],
// 3 16 11 20 -15 11 23 -15 15 30 -15
  [3,16,11,20,-15,11,23,-15,15,30,-15],
// 4 16 15 30 -15 15 0 -15 11 15.8 -15 11 20 -15
  [4,16,15,30,-15,15,0,-15,11,15.8,-15,11,20,-15],
// 4 16 -15 30 -15 15 30 -15 11 27 -15 -11 27 -15
  [4,16,-15,30,-15,15,30,-15,11,27,-15,-11,27,-15],
// 3 16 -11 23 -15 -15 30 -15 -11 27 -15
  [3,16,-11,23,-15,-15,30,-15,-11,27,-15],
// 4 16 -15 0 -15 -15 30 -15 -11 23 -15 -11 20 -15
  [4,16,-15,0,-15,-15,30,-15,-11,23,-15,-11,20,-15],
// 3 16 -15 0 -15 -11 20 -15 -11 15.8 -15
  [3,16,-15,0,-15,-11,20,-15,-11,15.8,-15],
];
module ldraw_lib__19729p05(step=0, col=false, unit=2/5, alt=false, line=0.2, solid=!$preview)
    makepoly(ldraw_lib__19729p05(), step=step, col=col, unit=unit, alt=alt, line=line, solid=solid);
ldraw_lib__19729p05(line=0.2);
